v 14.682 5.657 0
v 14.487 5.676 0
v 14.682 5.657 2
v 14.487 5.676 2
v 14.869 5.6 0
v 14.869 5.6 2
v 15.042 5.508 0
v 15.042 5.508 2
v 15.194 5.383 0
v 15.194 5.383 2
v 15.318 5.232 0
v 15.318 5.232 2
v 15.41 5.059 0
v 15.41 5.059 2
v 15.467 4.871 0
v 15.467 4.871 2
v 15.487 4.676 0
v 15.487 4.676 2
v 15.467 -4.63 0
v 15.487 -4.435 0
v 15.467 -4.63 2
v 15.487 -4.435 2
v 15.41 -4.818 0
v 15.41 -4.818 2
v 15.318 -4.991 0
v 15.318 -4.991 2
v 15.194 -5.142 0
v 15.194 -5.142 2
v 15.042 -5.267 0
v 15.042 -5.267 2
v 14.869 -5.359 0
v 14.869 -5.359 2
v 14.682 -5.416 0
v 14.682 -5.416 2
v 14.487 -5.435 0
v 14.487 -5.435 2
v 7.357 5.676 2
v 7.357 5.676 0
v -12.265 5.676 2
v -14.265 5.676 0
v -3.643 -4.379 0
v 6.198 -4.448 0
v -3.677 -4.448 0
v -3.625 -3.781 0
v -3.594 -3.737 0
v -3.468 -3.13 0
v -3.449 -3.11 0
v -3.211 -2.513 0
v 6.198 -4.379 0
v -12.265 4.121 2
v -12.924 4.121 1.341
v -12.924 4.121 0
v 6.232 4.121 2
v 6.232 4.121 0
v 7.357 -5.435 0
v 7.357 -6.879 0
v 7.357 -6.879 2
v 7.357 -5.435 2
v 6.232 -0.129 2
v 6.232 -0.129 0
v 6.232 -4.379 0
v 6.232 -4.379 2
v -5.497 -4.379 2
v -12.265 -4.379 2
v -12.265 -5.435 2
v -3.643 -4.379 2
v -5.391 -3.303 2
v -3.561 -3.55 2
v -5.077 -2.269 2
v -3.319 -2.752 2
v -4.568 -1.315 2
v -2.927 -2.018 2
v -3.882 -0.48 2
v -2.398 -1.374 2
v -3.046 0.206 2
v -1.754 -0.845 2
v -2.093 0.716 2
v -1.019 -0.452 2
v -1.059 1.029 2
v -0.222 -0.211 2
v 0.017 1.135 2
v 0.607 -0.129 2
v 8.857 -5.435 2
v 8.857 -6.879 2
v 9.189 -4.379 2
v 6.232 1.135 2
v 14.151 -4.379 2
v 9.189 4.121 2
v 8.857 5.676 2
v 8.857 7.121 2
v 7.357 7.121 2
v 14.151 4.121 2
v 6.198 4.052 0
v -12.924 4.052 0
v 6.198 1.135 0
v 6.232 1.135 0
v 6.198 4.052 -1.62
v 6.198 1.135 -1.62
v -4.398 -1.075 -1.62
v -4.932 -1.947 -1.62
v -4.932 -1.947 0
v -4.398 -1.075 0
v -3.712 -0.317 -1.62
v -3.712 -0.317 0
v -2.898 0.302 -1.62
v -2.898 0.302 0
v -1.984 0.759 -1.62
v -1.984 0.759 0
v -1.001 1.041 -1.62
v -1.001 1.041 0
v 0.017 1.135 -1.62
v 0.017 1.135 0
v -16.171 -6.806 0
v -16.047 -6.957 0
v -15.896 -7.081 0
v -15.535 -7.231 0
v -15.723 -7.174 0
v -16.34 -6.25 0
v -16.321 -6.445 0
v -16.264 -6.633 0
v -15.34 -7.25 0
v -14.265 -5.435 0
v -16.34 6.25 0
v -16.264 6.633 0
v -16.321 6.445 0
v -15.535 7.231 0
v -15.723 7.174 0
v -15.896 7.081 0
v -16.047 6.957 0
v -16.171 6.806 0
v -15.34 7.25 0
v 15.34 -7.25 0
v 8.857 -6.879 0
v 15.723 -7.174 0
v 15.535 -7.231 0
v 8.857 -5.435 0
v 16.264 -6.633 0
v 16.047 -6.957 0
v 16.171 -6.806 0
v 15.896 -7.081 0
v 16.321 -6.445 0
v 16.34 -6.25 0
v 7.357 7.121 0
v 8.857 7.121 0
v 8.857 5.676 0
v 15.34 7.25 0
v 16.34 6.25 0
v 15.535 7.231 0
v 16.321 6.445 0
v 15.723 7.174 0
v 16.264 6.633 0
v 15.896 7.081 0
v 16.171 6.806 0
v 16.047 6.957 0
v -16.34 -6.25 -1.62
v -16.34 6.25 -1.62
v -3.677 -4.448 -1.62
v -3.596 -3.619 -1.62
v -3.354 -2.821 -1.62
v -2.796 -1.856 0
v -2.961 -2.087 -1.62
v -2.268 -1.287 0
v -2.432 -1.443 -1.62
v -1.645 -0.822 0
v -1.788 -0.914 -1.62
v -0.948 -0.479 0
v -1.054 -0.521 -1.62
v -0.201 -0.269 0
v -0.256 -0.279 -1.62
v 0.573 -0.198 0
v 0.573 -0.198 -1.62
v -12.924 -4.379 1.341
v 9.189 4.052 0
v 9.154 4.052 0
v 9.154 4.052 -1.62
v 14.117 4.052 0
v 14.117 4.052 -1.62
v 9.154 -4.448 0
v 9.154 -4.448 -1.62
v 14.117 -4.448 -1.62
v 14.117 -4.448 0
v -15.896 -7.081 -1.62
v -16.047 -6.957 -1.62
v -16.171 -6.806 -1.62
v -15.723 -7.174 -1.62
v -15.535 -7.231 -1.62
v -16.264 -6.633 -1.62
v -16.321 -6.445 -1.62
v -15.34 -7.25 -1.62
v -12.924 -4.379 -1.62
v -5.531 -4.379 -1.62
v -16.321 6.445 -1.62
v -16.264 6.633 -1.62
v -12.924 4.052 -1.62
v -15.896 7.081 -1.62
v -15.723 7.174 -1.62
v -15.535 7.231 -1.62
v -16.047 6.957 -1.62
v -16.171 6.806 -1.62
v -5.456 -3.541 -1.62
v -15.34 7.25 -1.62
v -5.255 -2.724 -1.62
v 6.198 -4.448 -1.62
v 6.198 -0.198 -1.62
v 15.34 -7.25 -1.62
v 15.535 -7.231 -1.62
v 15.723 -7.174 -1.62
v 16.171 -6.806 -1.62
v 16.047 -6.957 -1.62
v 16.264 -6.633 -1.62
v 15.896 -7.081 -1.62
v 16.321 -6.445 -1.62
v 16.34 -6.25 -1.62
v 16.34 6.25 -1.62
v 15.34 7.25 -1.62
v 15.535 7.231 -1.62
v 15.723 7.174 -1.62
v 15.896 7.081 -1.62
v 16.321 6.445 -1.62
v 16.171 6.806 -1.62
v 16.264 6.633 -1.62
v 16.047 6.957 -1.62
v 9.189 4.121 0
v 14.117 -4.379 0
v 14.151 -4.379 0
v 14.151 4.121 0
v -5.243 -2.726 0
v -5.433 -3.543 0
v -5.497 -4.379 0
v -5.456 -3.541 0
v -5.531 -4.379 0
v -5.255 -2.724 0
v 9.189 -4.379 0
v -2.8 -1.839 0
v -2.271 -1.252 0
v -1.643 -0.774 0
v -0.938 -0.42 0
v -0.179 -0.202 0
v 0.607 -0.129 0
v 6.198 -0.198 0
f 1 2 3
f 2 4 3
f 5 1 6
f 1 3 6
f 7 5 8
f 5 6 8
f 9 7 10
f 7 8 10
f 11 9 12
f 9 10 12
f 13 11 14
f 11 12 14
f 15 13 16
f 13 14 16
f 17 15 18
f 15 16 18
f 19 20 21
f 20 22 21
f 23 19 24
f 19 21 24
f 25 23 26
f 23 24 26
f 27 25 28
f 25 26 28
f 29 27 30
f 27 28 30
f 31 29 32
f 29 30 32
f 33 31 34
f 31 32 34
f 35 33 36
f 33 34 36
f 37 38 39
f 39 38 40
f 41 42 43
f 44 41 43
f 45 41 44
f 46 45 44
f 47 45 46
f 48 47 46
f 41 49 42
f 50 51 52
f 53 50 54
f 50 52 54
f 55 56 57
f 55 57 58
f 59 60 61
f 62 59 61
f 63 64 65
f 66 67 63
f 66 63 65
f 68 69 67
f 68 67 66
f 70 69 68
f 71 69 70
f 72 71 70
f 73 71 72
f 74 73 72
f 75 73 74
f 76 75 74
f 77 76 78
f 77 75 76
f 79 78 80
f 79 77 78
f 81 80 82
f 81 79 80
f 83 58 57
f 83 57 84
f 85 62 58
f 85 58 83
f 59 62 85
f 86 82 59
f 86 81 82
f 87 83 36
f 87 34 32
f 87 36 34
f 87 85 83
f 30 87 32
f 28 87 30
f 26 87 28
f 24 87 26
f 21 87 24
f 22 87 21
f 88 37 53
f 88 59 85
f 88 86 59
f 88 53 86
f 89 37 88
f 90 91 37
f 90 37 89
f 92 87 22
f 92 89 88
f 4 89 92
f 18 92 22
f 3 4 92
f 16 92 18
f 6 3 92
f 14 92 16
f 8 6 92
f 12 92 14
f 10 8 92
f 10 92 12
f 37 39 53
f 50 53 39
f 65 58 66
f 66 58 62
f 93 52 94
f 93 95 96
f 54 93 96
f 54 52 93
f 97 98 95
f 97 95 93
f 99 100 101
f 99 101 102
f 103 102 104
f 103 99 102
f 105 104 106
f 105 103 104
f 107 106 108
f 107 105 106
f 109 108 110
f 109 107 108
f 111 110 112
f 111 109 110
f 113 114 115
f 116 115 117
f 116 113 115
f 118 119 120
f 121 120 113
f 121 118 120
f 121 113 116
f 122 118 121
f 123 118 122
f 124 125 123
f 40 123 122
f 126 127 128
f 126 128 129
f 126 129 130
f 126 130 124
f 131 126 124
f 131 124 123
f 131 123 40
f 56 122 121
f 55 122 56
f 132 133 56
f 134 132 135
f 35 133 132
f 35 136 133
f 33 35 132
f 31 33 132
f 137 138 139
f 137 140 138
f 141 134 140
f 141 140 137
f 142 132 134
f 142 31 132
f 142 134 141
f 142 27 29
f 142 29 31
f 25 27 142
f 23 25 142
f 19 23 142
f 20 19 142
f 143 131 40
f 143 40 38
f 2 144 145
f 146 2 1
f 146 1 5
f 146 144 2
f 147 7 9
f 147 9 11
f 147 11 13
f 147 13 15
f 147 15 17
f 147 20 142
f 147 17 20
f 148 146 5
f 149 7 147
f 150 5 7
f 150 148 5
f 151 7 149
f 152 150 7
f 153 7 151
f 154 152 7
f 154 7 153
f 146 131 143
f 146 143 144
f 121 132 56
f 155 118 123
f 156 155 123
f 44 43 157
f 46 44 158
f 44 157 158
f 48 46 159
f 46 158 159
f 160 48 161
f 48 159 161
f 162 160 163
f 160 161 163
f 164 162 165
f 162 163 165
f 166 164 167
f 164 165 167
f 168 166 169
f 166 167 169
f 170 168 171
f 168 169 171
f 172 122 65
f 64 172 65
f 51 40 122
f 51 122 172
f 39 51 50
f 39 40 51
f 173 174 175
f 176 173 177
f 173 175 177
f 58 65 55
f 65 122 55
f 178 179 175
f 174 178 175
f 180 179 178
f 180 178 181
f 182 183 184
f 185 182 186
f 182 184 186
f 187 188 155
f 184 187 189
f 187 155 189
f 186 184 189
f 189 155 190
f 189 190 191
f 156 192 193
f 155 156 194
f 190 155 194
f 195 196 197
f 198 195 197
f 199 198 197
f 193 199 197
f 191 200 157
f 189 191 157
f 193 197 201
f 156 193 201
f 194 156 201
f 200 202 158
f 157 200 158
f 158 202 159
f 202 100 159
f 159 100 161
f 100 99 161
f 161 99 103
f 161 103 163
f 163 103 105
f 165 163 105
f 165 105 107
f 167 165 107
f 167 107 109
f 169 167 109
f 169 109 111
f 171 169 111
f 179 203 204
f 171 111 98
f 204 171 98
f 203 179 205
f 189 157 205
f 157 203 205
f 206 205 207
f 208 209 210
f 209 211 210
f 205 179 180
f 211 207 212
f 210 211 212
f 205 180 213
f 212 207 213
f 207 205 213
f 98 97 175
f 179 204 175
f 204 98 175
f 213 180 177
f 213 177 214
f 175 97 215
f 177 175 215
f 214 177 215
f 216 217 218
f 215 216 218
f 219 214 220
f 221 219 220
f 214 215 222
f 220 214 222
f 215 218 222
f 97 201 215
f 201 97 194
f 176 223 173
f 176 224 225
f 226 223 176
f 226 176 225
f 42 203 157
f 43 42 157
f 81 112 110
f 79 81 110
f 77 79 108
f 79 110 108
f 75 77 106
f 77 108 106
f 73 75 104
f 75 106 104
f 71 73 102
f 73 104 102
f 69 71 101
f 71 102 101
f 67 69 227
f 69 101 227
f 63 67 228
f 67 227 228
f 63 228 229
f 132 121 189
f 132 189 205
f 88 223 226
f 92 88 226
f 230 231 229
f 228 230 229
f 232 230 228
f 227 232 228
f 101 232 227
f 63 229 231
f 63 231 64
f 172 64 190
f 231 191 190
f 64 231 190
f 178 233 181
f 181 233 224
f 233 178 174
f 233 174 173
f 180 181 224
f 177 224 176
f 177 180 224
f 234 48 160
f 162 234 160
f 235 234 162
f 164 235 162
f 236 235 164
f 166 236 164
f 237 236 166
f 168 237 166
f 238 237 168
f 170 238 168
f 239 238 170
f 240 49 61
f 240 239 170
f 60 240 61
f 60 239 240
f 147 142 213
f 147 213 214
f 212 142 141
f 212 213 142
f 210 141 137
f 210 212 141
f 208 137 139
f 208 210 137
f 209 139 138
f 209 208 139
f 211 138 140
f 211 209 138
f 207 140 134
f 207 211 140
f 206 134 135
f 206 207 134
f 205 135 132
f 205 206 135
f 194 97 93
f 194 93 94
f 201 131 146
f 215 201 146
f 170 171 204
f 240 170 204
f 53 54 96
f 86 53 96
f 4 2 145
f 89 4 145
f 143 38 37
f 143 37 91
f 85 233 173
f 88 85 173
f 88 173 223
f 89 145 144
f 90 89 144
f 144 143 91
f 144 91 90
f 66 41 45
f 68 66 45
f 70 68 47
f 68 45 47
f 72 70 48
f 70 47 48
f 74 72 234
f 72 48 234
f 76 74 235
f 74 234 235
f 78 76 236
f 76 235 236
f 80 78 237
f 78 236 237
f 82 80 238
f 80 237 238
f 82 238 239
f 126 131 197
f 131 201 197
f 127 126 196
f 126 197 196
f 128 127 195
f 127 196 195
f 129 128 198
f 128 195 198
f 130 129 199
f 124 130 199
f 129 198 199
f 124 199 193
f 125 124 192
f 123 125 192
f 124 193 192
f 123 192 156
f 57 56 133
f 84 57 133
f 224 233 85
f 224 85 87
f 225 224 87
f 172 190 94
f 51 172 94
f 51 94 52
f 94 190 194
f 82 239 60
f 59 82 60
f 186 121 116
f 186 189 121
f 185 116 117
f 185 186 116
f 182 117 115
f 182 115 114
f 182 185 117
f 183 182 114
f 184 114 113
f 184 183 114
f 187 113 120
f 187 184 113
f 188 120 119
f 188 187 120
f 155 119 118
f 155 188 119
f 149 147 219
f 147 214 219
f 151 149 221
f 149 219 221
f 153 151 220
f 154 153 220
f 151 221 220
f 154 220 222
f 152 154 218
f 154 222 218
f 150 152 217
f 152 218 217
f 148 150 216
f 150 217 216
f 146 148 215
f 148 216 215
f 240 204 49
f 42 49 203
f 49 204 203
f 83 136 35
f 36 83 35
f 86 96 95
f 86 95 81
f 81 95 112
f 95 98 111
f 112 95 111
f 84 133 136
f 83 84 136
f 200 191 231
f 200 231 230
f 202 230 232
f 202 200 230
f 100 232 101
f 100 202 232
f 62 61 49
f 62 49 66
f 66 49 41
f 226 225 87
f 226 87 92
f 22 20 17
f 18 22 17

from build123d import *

# Parameters (mm, degrees)
SKETCH1_W           = 32.68
SKETCH1_H           = 14.5
BOSS_EXTRUDE2_DEPTH = 1.62
SKETCH3_W           = 4.962331447
SKETCH3_H           = 8.5
SKETCH3_W_2         = 1.5
SKETCH3_H_2         = 1.444155173
SKETCH3_H_3         = 1.444155172
BOSS_EXTRUDE3_DEPTH = 2
CUT_EXTRUDE1_START  = -2
SKETCH4_W           = 4.962331446
SKETCH4_H           = 8.5
CUT_EXTRUDE1_DEPTH  = 2
FILLET1_R           = 1
CHAMFER1_SIZE       = 2.3


with BuildPart() as part:
    # Sketch1 → Boss-Extrude2 (new body)
    with BuildSketch(Plane.XY):
        Rectangle(SKETCH1_W, SKETCH1_H)
    extrude(amount=-BOSS_EXTRUDE2_DEPTH)

    # Sketch3 → Boss-Extrude3 (add)
    # profile 1 of 3: a face of its own
    with BuildSketch(Plane.XY):
        Polygon((7.357218521, 5.676374473), (-14.565223124, 5.676374473), (-14.565223124, -5.435315182), (7.357218521, -5.435315182), (8.857218521, -5.435315182), (15.486501014, -5.435315182), (15.486501014, 5.676374473), (8.857218521, 5.676374473), align=None)
        with BuildLine():
            Line((6.231943334, 4.121127688), (6.231943334, 2.506027416))
            Line((6.231943334, 2.506027416), (6.231943334, 1.135297756))
            Line((6.231943334, 1.135297756), (0.017218521, 1.135297756))
            ThreePointArc((0.017218521, 1.135297756), (-3.881888527, -0.479765264), (-5.496951548, -4.378872312))
            Line((-5.496951548, -4.378872312), (-12.923950607, -4.378872312))
            Line((-12.923950607, -4.378872312), (-12.923950607, 4.121127688))
            Line((-12.923950607, 4.121127688), (6.231943334, 4.121127688))
        make_face(mode=Mode.SUBTRACT)
        with BuildLine():
            Line((6.231943334, -0.128872312), (6.231943334, -4.378872312))
            Line((6.231943334, -4.378872312), (-3.642781479, -4.378872312))
            ThreePointArc((-3.642781479, -4.378872312), (-2.397985299, -1.373668492), (0.607218521, -0.128872312))
            Line((0.607218521, -0.128872312), (6.231943334, -0.128872312))
        make_face(mode=Mode.SUBTRACT)
        with Locations((11.670056084, -0.128872312)):
            Rectangle(SKETCH3_W, SKETCH3_H, mode=Mode.SUBTRACT)
    # profile 2 of 3: a face of its own
    with BuildSketch(Plane.XY):
        with Locations((8.107218521, -6.157392769)):
            Rectangle(SKETCH3_W_2, SKETCH3_H_2)
    # profile 3 of 3: a face of its own
    with BuildSketch(Plane.XY):
        with Locations((8.107218521, 6.398452059)):
            Rectangle(SKETCH3_W_2, SKETCH3_H_3)
    extrude(amount=BOSS_EXTRUDE3_DEPTH)

    # Sketch4 → Cut-Extrude1 (cut)
    with BuildSketch(Plane.XY.offset(CUT_EXTRUDE1_START)):
        with BuildLine():
            Line((6.197506292, 1.135297756), (6.197506292, 2.437153333))
            Line((6.197506292, 2.437153333), (6.197506292, 4.052253605))
            Line((6.197506292, 4.052253605), (-12.923950607, 4.052253605))
            Line((-12.923950607, 4.052253605), (-12.923950607, -4.378872312))
            Line((-12.923950607, -4.378872312), (-5.530958441, -4.378872312))
            ThreePointArc((-5.530958441, -4.378872312), (-5.371289583, -3.128657844), (-4.931903418, -1.947357645))
            ThreePointArc((-4.931903418, -1.947357645), (-2.898110461, 0.301611474), (0.017218521, 1.135297756))
            Line((0.017218521, 1.135297756), (6.197506292, 1.135297756))
        make_face()
        with BuildLine():
            ThreePointArc((-3.677218521, -4.447746395), (-2.432422341, -1.442542575), (0.572781479, -0.197746395))
            Line((0.572781479, -0.197746395), (6.197506292, -0.197746395))
            Line((6.197506292, -0.197746395), (6.197506292, -4.447746395))
            Line((6.197506292, -4.447746395), (-3.677218521, -4.447746395))
        make_face()
        with Locations((11.635619042, -0.197746395)):
            Rectangle(SKETCH4_W, SKETCH4_H)
    extrude(amount=CUT_EXTRUDE1_DEPTH, mode=Mode.SUBTRACT)

    # Fillet1
    fillet1_edges = [part.edges().sort_by_distance(p)[0] for p in [
        (15.486501014, -5.435315182, 1),
        (15.486501014, 5.676374473, 1),
        (16.34, -7.25, -0.81),
        (-16.34, -7.25, -0.81),
        (-16.34, 7.25, -0.81),
        (16.34, 7.25, -0.81),
    ]]
    fillet(fillet1_edges, radius=FILLET1_R)

    # Chamfer1
    # the kernel refuses this chamfer: 2.3 mm, written as the material it takes off along each edge
    with BuildSketch(Plane(origin=(-14.565223124, 11.591245345, 2), x_dir=(-0.02749587661058623, 0, -0.9996219169112968), z_dir=(0, -1, 0))) as chamfer1_piece_1_section:
        Polygon((CHAMFER1_SIZE * 0.999621916911, CHAMFER1_SIZE * 0.0274958766106), (-CHAMFER1_SIZE * 0.0274958766106, CHAMFER1_SIZE * 0.999621916911), (0, 0), align=None)
    chamfer1_piece_1 = extrude(amount=22.9414314, mode=Mode.PRIVATE)
    chamfer1_piece_1 = split(chamfer1_piece_1, bisect_by=Plane(origin=(-13.786723821, 0.120529645, 0), z_dir=(0, 0, 1)), keep=Keep.TOP, mode=Mode.PRIVATE)
    add(chamfer1_piece_1, mode=Mode.SUBTRACT)


solid = part.part
